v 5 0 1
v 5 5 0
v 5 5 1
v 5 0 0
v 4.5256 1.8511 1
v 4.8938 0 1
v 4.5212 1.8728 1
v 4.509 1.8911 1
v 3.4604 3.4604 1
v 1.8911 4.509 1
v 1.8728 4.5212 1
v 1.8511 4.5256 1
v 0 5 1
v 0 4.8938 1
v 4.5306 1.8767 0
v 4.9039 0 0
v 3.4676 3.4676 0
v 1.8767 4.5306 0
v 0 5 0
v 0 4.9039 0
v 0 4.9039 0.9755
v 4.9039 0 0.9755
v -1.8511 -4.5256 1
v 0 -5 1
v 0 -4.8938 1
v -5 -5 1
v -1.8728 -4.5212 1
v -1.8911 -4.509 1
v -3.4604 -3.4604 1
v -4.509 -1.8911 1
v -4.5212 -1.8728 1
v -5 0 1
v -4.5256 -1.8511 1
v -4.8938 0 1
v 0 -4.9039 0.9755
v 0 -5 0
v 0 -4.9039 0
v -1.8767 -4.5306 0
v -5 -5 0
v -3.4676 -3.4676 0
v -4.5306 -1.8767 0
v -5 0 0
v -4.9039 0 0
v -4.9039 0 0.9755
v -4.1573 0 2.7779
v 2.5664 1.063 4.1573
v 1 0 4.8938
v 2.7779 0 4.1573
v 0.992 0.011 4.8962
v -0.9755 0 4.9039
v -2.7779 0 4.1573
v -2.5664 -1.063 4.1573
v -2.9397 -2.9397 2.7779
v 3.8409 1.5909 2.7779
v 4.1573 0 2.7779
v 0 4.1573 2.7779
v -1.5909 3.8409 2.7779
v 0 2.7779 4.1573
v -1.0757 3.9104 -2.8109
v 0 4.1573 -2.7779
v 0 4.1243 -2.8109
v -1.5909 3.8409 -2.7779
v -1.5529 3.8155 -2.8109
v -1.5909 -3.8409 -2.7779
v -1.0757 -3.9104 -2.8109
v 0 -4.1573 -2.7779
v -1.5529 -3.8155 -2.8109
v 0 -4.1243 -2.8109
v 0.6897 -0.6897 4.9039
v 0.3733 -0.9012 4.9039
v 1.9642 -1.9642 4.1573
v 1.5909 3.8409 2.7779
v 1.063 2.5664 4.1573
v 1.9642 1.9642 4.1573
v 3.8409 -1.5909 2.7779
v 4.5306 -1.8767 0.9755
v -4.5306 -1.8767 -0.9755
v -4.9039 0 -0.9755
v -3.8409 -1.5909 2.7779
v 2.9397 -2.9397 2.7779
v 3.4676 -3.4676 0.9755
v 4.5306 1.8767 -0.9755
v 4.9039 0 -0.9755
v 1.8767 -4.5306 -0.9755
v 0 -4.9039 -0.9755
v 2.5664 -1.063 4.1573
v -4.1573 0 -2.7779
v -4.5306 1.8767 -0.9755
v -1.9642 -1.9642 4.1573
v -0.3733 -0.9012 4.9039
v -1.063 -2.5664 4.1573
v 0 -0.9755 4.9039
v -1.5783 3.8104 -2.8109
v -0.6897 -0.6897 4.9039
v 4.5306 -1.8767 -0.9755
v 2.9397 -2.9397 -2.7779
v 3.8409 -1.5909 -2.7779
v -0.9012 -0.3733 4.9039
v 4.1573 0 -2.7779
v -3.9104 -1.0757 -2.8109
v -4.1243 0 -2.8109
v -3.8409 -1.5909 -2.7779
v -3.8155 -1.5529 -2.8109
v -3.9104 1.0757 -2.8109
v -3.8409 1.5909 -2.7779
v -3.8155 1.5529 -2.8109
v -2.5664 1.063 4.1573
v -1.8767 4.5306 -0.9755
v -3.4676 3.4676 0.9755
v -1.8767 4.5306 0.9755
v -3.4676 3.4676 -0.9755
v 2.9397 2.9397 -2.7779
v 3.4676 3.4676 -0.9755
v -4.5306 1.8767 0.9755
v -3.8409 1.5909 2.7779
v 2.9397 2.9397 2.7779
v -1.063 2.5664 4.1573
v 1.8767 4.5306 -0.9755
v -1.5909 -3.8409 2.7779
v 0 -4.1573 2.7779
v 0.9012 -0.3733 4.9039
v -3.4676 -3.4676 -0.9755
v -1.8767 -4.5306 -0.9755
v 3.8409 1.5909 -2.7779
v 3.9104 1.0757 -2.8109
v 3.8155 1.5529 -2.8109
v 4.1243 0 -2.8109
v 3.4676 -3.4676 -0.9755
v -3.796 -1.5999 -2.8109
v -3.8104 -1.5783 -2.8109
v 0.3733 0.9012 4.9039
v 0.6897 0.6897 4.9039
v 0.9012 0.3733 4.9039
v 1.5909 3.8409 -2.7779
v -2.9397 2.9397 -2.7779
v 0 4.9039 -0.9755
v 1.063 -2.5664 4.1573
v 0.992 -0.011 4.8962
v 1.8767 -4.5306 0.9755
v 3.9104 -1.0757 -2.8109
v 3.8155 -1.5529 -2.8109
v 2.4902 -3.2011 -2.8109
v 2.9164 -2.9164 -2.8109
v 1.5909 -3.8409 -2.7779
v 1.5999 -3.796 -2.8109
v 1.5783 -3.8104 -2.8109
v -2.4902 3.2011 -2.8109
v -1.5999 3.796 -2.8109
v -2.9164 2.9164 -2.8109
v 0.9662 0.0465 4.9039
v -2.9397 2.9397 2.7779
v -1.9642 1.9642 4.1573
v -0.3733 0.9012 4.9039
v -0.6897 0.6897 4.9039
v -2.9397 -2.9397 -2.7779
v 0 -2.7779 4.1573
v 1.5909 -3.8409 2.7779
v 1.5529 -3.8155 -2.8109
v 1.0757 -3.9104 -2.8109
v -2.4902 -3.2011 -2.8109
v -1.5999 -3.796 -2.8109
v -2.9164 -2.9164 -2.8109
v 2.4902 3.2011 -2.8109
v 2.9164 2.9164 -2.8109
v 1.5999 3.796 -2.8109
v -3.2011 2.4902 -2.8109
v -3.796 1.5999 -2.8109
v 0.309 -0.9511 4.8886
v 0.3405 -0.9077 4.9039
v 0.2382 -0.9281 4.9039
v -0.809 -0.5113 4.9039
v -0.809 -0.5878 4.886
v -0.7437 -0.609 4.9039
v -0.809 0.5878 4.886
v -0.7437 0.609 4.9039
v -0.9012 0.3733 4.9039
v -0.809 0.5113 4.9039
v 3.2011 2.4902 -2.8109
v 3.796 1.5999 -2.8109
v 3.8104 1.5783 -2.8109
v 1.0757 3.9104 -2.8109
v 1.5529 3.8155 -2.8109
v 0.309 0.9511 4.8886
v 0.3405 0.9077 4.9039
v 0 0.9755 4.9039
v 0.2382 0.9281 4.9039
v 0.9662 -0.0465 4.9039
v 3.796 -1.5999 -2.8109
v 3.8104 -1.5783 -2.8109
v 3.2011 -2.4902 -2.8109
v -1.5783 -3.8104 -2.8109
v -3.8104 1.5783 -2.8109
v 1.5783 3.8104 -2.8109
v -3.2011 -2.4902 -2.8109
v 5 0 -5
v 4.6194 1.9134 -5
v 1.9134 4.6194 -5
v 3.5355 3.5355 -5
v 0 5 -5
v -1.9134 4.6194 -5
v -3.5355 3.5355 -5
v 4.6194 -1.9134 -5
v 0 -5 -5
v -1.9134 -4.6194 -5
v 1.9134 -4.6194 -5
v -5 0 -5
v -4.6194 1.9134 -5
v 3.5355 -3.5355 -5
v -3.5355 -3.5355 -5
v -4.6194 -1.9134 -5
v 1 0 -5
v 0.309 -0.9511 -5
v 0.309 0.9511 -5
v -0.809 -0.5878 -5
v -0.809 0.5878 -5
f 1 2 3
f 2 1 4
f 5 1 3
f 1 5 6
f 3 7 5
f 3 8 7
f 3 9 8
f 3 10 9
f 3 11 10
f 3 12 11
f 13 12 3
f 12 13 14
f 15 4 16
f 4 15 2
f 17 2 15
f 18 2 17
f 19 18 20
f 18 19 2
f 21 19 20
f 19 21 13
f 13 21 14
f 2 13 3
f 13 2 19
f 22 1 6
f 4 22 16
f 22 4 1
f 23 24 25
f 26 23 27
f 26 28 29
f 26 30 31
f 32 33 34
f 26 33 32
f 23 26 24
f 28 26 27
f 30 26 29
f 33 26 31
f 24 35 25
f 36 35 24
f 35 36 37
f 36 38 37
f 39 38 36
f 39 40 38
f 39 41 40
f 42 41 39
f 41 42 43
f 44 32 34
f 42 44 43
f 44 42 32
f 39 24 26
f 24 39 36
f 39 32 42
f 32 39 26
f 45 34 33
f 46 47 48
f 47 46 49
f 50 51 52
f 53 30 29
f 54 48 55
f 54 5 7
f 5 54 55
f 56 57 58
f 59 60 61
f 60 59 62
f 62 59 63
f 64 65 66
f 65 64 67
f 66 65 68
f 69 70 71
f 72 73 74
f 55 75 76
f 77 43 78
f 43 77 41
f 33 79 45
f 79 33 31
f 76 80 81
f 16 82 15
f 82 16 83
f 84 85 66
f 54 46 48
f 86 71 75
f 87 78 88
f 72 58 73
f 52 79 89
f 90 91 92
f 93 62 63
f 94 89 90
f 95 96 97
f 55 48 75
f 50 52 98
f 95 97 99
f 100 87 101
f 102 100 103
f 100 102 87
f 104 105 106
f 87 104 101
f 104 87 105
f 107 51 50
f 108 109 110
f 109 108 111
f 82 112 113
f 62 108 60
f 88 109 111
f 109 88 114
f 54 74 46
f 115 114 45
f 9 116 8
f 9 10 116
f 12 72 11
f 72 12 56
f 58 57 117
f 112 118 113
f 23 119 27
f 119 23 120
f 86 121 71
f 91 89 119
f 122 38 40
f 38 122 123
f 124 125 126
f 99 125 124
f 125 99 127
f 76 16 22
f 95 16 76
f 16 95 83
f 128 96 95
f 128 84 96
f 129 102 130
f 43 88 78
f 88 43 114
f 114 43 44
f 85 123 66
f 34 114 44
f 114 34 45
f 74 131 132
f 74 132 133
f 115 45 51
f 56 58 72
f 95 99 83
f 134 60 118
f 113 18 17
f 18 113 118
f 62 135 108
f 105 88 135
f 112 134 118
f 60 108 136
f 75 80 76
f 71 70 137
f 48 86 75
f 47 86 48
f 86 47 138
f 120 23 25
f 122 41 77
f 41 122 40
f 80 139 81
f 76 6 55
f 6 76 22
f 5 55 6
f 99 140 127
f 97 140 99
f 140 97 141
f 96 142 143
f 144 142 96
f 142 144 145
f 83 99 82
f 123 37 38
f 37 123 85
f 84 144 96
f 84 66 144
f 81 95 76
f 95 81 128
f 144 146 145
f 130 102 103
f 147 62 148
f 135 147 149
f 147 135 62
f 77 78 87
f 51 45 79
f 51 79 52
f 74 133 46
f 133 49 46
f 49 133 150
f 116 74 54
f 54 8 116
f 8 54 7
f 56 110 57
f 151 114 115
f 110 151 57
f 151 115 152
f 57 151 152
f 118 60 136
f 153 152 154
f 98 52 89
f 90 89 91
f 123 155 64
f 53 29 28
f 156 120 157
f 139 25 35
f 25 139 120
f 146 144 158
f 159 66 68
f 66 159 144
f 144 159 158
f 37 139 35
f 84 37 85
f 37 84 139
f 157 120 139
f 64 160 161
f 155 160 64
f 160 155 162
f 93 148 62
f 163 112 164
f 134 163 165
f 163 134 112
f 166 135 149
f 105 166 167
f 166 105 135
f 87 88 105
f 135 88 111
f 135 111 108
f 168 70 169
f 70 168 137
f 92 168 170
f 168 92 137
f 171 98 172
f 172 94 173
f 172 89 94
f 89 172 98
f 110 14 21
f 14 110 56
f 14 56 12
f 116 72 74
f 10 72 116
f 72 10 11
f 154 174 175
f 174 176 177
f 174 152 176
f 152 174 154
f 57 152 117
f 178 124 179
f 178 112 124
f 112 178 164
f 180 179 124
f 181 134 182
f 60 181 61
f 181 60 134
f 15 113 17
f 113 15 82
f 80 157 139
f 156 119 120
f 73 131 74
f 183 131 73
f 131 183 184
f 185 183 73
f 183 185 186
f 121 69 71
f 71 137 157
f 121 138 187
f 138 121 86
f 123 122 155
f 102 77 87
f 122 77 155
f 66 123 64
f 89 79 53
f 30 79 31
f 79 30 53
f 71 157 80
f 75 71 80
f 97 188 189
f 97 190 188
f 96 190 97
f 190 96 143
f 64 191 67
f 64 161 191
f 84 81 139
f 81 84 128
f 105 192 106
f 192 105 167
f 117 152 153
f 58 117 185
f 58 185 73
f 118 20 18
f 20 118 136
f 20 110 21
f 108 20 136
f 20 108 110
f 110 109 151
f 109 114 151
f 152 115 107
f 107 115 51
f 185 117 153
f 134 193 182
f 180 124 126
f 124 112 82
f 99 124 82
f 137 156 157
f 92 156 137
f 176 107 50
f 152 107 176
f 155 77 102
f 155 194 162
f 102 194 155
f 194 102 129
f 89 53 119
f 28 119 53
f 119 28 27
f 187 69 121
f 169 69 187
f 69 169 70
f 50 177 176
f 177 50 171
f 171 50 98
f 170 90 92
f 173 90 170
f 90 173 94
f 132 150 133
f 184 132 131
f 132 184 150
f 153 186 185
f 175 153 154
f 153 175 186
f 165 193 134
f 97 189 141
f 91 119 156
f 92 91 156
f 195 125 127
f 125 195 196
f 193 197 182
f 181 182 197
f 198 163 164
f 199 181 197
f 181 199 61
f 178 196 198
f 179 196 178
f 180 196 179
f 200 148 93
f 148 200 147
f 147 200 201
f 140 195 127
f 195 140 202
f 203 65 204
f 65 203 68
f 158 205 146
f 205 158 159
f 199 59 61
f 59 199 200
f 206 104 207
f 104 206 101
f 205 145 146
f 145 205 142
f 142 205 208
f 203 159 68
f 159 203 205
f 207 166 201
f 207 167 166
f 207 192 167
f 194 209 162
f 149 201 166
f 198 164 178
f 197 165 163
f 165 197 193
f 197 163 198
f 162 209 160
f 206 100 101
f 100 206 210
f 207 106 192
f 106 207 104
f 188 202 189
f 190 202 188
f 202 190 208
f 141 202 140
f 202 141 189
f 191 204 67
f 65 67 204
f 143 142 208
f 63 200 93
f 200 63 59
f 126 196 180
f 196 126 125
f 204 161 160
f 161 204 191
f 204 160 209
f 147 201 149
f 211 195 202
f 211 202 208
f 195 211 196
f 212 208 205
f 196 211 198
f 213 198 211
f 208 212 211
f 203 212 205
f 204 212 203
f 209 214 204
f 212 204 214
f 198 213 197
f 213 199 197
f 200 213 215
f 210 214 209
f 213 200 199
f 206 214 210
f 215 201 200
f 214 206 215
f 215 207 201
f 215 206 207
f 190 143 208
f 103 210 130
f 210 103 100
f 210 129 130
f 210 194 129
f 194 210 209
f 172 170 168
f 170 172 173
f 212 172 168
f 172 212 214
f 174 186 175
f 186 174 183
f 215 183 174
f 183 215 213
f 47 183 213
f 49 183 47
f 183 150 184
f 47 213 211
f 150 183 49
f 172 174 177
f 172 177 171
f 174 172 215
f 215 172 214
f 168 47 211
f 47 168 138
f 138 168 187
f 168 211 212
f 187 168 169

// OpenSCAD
// test

difference()
{
		union()
		{
				union()
				{
					cube([5,5,1]);
					rotate([0, 0, 180]) cube([5,5,1]);
					sphere(5);
				}
				translate([0, 0, -5]) cylinder(h=5, r1=5, r2=3);
		}
		// x y z
		translate([0, 0, -6])
			cylinder(h=20, r1=1, r2=1);
}
